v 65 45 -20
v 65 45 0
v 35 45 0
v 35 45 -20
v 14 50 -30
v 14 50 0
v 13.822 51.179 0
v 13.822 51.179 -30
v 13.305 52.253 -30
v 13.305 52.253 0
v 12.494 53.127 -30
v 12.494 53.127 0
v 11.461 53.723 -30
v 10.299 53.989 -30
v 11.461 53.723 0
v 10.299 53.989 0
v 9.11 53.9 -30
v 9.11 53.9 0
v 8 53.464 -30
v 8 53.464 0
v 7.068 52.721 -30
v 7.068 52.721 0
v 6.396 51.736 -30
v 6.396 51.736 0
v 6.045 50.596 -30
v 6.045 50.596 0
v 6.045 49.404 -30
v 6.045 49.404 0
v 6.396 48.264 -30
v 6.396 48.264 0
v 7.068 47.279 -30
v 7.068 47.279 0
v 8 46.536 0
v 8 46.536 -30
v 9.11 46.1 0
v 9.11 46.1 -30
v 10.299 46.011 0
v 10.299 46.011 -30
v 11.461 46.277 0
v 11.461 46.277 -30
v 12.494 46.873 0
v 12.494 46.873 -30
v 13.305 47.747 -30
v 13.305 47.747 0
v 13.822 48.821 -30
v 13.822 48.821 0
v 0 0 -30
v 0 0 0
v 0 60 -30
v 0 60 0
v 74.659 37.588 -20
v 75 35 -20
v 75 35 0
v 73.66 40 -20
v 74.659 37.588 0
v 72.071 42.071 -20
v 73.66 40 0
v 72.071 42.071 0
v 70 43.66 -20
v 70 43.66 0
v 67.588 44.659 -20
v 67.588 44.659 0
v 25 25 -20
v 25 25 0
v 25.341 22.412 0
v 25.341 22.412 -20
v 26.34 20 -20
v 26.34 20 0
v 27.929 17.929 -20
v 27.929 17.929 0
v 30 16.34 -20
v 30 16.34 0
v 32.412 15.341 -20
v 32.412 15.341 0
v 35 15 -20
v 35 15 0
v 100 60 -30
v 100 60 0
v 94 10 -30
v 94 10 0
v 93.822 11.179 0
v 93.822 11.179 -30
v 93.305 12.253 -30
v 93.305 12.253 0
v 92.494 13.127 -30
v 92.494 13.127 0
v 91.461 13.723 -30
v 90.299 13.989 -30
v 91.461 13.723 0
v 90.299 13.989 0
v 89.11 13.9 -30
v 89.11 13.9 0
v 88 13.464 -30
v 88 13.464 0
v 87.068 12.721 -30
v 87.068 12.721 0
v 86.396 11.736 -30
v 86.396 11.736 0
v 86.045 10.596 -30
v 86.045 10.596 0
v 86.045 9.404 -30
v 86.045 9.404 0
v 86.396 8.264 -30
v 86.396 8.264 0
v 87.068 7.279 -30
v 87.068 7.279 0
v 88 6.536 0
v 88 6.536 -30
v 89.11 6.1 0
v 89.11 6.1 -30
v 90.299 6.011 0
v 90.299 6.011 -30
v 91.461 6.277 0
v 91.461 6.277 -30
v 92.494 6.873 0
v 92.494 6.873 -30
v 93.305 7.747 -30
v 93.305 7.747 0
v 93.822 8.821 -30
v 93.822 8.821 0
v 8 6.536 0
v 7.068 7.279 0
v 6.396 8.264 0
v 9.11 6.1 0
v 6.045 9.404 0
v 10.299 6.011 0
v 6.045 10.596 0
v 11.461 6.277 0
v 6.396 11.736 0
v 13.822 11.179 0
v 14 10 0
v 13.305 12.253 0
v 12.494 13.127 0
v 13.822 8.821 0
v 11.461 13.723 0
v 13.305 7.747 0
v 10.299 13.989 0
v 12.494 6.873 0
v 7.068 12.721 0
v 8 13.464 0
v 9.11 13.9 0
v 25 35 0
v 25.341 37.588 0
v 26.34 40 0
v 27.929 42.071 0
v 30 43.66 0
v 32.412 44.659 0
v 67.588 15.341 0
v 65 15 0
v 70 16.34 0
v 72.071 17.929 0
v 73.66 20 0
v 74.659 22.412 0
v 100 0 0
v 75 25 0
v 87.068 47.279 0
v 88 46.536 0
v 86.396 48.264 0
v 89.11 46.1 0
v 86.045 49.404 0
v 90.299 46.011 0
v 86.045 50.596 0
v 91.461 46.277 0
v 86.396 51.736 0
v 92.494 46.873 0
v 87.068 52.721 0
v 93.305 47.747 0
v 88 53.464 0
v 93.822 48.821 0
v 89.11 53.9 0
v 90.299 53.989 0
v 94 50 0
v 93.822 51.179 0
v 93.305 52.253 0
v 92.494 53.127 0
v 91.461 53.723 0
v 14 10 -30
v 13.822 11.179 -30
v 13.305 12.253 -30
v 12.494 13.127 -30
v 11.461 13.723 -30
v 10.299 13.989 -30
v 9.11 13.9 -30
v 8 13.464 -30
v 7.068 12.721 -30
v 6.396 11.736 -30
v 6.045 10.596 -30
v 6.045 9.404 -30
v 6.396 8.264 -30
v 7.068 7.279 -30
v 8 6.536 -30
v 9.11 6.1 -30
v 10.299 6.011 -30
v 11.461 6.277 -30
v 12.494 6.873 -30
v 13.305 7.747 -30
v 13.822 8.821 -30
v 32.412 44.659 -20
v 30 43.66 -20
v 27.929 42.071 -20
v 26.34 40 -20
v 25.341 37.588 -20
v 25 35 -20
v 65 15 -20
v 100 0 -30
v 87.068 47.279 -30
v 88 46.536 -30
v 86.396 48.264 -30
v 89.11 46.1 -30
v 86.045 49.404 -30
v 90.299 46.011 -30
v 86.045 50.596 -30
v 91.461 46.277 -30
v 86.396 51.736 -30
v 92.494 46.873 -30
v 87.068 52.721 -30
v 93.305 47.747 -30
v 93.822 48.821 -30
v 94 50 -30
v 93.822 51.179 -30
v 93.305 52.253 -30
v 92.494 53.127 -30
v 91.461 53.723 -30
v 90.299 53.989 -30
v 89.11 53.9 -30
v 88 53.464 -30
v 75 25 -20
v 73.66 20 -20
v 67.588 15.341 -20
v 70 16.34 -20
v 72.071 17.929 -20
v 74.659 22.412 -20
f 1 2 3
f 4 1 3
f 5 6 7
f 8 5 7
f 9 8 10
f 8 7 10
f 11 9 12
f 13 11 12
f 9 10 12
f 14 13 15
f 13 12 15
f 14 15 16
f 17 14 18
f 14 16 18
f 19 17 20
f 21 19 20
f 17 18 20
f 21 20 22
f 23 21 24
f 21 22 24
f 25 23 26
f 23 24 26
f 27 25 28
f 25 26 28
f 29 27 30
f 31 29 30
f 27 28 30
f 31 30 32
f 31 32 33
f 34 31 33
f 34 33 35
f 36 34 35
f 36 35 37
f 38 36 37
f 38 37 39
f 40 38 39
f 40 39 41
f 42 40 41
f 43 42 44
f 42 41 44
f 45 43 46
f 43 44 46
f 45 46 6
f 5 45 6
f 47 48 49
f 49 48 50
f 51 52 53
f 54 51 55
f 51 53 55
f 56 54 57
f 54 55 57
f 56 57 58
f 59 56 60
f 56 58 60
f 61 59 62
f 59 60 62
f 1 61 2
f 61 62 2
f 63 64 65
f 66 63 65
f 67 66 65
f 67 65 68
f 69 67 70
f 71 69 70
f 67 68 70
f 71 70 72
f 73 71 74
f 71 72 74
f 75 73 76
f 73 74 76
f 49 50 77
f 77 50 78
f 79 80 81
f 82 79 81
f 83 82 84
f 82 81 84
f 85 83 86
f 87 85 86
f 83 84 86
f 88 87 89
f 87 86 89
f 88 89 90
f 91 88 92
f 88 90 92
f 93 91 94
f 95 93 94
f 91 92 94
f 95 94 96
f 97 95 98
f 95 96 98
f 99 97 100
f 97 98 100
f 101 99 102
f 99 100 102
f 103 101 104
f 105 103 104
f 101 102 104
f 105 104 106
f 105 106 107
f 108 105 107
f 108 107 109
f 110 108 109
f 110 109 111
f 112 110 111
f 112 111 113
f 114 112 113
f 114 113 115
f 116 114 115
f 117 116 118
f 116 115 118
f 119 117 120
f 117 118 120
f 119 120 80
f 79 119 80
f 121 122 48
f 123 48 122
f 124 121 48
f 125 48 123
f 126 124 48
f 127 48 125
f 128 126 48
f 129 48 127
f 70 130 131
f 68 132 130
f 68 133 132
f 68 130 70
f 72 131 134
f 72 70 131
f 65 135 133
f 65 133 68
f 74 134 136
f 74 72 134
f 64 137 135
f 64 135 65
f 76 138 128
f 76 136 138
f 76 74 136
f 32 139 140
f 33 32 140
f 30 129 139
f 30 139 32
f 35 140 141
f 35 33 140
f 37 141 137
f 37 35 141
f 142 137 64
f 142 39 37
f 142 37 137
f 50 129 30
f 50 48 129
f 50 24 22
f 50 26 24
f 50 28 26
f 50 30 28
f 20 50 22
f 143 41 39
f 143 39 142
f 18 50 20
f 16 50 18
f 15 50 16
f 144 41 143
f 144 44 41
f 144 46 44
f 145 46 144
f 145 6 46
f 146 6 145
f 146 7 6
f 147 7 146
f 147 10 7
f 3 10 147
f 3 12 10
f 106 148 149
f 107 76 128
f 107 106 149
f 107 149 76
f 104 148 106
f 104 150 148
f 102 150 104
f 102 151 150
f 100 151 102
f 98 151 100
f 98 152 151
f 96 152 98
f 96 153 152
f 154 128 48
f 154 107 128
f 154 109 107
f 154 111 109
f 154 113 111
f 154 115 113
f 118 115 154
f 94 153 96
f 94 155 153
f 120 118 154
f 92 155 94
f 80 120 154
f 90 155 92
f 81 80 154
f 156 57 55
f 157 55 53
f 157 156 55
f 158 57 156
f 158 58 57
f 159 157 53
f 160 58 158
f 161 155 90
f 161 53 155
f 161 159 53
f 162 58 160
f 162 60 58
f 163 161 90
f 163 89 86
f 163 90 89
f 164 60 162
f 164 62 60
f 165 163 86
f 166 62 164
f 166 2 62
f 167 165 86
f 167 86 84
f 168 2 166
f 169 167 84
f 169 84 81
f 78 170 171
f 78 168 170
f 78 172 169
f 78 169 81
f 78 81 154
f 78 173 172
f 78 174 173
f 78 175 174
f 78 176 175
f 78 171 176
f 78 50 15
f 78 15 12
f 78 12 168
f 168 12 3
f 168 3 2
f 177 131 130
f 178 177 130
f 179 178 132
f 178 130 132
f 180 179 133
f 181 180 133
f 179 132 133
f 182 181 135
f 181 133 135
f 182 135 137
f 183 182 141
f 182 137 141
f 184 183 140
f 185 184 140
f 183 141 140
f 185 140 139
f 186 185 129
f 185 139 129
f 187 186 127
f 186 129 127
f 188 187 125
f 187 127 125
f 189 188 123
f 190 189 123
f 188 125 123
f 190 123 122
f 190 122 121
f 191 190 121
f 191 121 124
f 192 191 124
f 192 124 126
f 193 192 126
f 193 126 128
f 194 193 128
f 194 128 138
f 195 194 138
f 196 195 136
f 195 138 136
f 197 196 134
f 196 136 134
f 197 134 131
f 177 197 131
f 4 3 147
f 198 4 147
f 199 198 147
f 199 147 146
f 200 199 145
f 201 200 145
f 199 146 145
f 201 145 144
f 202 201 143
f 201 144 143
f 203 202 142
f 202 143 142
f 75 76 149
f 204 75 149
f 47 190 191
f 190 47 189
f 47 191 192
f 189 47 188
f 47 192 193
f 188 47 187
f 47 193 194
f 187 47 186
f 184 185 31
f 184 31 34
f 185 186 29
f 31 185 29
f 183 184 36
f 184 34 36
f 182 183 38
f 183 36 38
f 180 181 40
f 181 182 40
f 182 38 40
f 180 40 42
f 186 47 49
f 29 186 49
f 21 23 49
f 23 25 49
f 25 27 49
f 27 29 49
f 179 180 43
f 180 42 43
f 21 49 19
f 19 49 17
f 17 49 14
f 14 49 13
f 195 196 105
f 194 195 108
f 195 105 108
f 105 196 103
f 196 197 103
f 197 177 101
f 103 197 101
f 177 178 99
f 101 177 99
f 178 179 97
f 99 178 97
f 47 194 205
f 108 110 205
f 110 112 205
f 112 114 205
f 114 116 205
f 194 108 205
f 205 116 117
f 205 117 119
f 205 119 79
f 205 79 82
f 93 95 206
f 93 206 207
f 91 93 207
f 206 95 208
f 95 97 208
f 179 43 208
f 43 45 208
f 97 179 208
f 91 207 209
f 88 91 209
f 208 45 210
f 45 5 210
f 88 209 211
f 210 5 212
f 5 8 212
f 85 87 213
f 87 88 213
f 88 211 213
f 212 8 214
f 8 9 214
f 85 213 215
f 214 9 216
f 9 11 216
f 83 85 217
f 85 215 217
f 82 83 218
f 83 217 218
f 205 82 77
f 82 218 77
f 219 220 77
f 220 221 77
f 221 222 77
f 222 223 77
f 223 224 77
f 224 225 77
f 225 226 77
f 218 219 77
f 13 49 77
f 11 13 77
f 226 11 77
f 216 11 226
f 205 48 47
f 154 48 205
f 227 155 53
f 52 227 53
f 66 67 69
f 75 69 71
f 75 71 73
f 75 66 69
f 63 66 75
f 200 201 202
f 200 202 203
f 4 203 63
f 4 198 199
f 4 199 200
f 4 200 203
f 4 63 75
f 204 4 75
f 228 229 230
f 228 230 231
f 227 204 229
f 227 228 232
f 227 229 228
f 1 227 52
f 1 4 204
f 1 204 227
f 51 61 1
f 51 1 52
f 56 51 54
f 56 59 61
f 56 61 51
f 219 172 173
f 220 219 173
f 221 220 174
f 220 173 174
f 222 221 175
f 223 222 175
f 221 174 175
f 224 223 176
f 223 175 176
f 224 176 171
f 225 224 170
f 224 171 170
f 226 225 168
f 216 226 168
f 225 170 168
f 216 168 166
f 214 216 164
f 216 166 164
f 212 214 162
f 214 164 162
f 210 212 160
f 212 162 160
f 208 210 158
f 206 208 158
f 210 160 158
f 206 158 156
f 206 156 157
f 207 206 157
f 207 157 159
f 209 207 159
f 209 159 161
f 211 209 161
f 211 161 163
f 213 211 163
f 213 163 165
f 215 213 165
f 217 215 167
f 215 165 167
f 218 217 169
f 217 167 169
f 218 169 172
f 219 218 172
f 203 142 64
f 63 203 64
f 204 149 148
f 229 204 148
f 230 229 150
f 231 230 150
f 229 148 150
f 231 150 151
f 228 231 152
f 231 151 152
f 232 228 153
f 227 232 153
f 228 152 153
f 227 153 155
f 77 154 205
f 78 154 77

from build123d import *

# Parameters (mm, degrees)
ESBO_O1_W       = 100
ESBO_O1_H       = 60
ESBO_O1_R       = 4
EXTRUS_O2_DEPTH = 30
EXTRUS_O3_DEPTH = 20


with BuildPart() as part:
    # Esbo_o1 → Extrus_o2 (new body)
    with BuildSketch(Plane.XY):
        with Locations((50, 30)):
            Rectangle(ESBO_O1_W, ESBO_O1_H)
        with Locations((90, 10)):
            Circle(ESBO_O1_R, mode=Mode.SUBTRACT)
        with Locations((10, 10)):
            Circle(ESBO_O1_R, mode=Mode.SUBTRACT)
        with Locations((10, 50)):
            Circle(ESBO_O1_R, mode=Mode.SUBTRACT)
        with Locations((90, 50)):
            Circle(ESBO_O1_R, mode=Mode.SUBTRACT)
        with BuildLine():
            ThreePointArc((25, 25), (27.928932188, 17.928932188), (35, 15))
            Line((35, 15), (65, 15))
            ThreePointArc((65, 15), (72.071067812, 17.928932188), (75, 25))
            Line((75, 25), (75, 35))
            ThreePointArc((75, 35), (72.071067812, 42.071067812), (65, 45))
            Line((65, 45), (35, 45))
            ThreePointArc((35, 45), (27.928932188, 42.071067812), (25, 35))
            Line((25, 35), (25, 25))
        make_face(mode=Mode.SUBTRACT)
        with BuildLine():
            Line((25, 35), (25, 25))
            ThreePointArc((25, 25), (27.928932188, 17.928932188), (35, 15))
            Line((35, 15), (65, 15))
            ThreePointArc((65, 15), (72.071067812, 17.928932188), (75, 25))
            Line((75, 25), (75, 35))
            ThreePointArc((75, 35), (72.071067812, 42.071067812), (65, 45))
            Line((65, 45), (35, 45))
            ThreePointArc((35, 45), (27.928932188, 42.071067812), (25, 35))
        make_face()
    extrude(amount=-EXTRUS_O2_DEPTH)

    # Esbo_o1_4 → Extrus_o3 (cut)
    with BuildSketch(Plane.XY):
        with BuildLine():
            Line((25, 35), (25, 25))
            ThreePointArc((25, 25), (27.928932188, 17.928932188), (35, 15))
            Line((35, 15), (65, 15))
            ThreePointArc((65, 15), (72.071067812, 17.928932188), (75, 25))
            Line((75, 25), (75, 35))
            ThreePointArc((75, 35), (72.071067812, 42.071067812), (65, 45))
            Line((65, 45), (35, 45))
            ThreePointArc((35, 45), (27.928932188, 42.071067812), (25, 35))
        make_face()
    extrude(amount=-EXTRUS_O3_DEPTH, mode=Mode.SUBTRACT)


solid = part.part
